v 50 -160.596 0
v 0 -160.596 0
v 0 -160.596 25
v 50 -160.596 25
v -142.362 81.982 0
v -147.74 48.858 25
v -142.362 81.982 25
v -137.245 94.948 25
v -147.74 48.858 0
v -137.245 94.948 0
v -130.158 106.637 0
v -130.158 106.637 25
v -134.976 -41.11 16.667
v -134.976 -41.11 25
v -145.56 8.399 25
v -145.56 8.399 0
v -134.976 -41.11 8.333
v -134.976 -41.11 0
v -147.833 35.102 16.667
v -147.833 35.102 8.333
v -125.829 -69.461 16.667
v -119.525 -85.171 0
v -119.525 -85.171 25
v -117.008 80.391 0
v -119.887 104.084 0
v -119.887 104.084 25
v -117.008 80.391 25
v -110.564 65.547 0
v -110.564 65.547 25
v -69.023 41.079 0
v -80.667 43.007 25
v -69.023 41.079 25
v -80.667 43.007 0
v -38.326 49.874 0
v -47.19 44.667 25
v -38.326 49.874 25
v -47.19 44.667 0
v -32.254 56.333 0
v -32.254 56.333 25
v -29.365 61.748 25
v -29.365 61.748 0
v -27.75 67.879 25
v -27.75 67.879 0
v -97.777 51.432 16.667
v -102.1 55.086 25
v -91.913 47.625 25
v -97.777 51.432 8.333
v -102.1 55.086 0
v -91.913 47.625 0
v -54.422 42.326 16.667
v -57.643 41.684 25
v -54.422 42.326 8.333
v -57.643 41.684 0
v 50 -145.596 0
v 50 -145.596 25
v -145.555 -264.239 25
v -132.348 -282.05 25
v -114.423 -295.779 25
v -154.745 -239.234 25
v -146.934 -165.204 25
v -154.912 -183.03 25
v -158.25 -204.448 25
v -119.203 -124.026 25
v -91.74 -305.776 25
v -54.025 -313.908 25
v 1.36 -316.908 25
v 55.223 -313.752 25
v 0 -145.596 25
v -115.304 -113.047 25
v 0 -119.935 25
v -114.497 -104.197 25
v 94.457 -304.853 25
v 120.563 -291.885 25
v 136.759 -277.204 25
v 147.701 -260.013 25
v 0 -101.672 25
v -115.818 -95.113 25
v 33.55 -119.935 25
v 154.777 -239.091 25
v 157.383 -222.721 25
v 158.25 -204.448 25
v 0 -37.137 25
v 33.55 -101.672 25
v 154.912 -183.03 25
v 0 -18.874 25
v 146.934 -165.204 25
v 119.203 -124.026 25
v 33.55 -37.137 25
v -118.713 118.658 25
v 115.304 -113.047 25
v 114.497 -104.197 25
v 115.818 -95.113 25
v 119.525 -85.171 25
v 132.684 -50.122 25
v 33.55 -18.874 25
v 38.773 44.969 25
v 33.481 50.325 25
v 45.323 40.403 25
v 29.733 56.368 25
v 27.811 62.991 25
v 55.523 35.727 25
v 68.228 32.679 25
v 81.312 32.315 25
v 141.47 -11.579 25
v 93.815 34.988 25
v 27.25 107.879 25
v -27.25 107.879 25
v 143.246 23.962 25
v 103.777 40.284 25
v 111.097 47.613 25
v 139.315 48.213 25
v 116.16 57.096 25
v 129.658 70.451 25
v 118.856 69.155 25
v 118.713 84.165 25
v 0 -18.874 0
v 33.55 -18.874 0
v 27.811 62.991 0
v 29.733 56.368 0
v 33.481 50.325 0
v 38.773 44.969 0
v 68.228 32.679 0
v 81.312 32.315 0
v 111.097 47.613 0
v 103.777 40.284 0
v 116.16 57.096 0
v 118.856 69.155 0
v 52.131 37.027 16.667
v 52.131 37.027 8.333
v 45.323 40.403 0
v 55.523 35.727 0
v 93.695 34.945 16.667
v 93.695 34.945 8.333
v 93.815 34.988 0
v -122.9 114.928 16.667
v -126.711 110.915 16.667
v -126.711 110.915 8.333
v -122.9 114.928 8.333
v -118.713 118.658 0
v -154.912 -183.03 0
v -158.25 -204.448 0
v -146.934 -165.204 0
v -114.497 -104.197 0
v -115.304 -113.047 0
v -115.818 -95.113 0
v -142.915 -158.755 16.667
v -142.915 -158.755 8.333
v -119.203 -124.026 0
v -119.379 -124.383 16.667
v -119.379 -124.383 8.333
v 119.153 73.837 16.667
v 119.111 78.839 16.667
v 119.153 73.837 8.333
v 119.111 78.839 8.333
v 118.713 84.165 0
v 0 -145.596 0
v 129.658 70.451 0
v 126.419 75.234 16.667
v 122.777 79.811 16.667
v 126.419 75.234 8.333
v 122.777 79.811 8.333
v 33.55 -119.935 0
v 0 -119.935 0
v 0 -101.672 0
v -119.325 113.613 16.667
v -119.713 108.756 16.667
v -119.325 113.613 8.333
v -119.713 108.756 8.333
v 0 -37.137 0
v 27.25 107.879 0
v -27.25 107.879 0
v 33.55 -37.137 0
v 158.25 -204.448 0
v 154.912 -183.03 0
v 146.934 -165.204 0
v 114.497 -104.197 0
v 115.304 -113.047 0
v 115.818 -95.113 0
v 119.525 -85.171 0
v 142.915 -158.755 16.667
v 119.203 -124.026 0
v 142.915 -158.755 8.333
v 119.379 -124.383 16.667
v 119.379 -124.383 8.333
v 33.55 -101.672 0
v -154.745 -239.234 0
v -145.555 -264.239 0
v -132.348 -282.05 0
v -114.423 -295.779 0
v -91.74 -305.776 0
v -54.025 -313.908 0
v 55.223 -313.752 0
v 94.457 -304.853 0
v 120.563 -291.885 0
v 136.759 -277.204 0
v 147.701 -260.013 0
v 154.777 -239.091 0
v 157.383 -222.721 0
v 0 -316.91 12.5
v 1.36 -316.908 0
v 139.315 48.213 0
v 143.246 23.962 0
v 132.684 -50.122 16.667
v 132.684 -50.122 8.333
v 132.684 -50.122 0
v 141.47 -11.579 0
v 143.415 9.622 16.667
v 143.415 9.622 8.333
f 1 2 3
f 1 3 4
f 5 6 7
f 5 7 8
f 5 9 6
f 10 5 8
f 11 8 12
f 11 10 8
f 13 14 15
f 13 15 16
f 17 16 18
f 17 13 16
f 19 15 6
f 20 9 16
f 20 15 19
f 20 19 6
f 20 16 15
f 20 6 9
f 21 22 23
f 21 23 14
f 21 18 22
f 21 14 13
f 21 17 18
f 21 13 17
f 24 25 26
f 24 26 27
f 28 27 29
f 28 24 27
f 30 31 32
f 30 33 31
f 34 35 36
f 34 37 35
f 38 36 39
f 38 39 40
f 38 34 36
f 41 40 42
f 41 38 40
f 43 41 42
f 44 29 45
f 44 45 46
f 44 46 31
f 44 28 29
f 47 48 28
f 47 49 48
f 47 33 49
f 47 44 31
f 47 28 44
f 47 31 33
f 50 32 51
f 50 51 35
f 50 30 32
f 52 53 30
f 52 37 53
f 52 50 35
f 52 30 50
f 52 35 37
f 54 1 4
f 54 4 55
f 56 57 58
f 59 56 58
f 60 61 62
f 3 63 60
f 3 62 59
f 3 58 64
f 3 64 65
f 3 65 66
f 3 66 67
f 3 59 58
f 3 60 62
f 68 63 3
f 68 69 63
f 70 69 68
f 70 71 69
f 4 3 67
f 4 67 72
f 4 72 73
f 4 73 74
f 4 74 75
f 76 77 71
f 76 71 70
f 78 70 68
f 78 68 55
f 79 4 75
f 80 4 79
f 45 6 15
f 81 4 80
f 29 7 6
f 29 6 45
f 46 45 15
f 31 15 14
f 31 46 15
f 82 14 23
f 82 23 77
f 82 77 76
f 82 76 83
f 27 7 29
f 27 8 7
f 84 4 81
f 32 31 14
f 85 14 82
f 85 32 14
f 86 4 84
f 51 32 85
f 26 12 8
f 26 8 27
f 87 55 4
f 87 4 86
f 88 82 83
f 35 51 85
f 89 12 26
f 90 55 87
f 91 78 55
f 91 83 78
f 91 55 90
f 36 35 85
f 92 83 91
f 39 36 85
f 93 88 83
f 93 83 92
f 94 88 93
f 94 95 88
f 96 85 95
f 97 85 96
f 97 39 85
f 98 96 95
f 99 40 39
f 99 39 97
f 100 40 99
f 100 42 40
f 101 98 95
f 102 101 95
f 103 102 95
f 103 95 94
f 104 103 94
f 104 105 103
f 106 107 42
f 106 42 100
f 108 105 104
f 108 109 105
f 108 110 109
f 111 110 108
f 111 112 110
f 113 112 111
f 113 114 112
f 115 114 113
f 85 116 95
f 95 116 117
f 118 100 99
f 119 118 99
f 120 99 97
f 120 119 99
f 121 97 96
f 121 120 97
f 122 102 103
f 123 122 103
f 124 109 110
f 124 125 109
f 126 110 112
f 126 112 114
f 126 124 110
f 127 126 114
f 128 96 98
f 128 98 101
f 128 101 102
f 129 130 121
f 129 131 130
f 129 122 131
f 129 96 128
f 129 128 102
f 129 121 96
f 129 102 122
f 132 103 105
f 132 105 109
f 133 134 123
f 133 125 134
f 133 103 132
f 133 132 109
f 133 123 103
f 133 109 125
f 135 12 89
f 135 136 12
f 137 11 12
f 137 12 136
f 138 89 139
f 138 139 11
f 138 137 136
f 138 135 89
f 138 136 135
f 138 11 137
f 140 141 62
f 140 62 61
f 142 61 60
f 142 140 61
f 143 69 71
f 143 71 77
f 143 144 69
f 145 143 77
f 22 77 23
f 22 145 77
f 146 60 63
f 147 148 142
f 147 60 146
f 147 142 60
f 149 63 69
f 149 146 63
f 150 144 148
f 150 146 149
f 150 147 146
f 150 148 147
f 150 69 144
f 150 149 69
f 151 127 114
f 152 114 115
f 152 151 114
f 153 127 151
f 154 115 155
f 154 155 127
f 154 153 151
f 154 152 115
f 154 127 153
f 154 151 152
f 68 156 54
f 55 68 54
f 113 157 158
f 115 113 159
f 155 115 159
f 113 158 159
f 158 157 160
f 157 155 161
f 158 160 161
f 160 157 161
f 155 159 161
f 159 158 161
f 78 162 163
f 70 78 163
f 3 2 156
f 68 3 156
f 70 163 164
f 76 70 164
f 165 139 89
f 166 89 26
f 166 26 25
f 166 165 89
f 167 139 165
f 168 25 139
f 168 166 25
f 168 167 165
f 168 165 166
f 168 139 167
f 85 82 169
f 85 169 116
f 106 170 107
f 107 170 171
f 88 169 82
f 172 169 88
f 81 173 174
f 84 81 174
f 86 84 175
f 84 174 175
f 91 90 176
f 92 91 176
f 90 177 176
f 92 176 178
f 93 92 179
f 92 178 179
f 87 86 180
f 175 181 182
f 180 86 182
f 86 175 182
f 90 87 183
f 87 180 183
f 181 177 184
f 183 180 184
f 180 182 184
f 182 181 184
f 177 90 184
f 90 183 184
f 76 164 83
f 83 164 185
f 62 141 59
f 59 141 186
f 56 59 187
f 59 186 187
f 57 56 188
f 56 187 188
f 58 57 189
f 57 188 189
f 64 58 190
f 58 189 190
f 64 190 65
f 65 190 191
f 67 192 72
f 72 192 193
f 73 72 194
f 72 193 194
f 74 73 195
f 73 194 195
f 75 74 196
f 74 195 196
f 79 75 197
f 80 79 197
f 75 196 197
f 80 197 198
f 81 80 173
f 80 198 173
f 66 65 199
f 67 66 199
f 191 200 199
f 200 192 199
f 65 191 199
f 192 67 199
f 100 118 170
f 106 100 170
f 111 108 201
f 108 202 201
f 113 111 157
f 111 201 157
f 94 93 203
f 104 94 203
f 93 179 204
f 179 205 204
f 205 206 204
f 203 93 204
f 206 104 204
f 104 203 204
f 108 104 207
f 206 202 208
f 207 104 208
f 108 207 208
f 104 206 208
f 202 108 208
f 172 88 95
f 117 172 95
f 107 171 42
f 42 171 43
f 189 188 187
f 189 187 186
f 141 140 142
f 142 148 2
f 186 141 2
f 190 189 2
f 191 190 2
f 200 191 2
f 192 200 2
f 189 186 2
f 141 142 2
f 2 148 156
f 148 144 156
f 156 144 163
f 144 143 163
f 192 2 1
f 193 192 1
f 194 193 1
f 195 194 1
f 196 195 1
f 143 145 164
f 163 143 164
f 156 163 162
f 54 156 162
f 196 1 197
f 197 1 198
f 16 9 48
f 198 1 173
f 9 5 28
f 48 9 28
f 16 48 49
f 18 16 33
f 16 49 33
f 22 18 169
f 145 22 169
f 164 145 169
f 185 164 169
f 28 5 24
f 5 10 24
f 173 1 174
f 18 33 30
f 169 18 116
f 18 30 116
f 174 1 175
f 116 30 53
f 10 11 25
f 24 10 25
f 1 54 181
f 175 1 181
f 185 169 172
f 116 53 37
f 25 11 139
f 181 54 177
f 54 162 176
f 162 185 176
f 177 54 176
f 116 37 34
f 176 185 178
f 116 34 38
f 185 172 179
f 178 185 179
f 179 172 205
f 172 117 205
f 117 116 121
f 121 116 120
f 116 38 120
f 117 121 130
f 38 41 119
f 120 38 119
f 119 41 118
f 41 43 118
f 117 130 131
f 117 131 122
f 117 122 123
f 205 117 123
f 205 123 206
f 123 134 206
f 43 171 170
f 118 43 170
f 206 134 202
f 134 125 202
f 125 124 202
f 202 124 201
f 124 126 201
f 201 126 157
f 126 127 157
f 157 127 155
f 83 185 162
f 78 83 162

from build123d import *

# Parameters (mm, degrees)
F0_W     = 50
F0_H     = 15
F0_W_2   = 33.55
F0_H_2   = 18.263
F1_DEPTH = 25


# Not quite as in the source:
# - a feature names something its author has since deleted; it is built from what else it names


with BuildPart() as f1:
    # F0 (on Top) → F1 (new body)
    with BuildSketch(Plane.XY):
        Polygon((27.25, 107.8786835152), (-27.25, 107.8786835152), (-27.75, 67.8786835152), (-28.0282922993, 45.6152995713), (-28.25, 27.8786835152), (28.25, 27.8786835152), (28.0907844192, 40.6159299829), (27.8110993763, 62.99073341), align=None)
        with BuildLine():
            Line((-28.0282922993, 45.6152995713), (-27.75, 67.8786835152))
            add(Edge.make_bspline(
                [(-119.8866222784, 104.0838235955), (-121.0423578492, 26.6975843315), (-33.4381163475, 27.9588649836), (-27.75, 67.8786835152)],
                knots=[5.8207414298, 5.8207414298, 5.8207414298, 5.8207414298, 104.177036671, 104.177036671, 104.177036671, 104.177036671], degree=3))
            add(Edge.make_bspline(
                [(-129.4312865498, 88.9177944447), (-128.9681788838, 89.9439533029), (-126.7042715733, 94.6909513961), (-123.5656981618, 99.854792643), (-120.3833088728, 103.5358856243), (-119.8866222778, 104.0838235953)],
                knots=[174.7937382561, 174.7937382561, 174.7937382561, 174.7937382561, 178.1663413599, 190.5368056939, 192.7537167942, 192.7537167942, 192.7537167942, 192.7537167942], degree=3))
            add(Edge.make_bspline(
                [(-129.4312865498, 88.9177944447), (-129.3109849454, 88.0758069), (-128.4336564101, 82.4912333506), (-125.9636072037, 72.6752311218), (-120.2024501307, 60.4880102216), (-112.6215186167, 50.3680139367), (-103.6339611104, 42.3905323107), (-93.696674412, 36.532063254), (-83.2179047221, 32.6896328601), (-72.5392583415, 30.7367375732), (-61.9410573447, 30.5552142432), (-51.6845955009, 32.0994665415), (-42.5038344938, 35.1003258688), (-35.1676094551, 39.272763754), (-30.7048923289, 42.9689824885), (-28.563789449, 45.0637979027), (-28.0282922993, 45.6152995713)],
                knots=[31.2550682463, 31.2550682463, 31.2550682463, 31.2550682463, 33.8015913522, 48.177750167, 61.4744919422, 73.96612477, 85.8554939797, 97.2898755487, 108.3722273852, 119.1669646926, 129.7095146782, 140.0247340346, 150.1520713556, 158.5067230901, 165.1780752822, 167.4830132535, 167.4830132535, 167.4830132535, 167.4830132535], degree=3))
        make_face()
        with BuildLine():
            add(Edge.make_bspline(
                [(27.8110993763, 62.99073341), (32.2933669496, 29.2229355953), (113.1124852102, 12.6623549852), (118.8562015646, 69.1546411271)],
                knots=[0, 0, 0, 0, 86.4138969398, 86.4138969398, 86.4138969398, 86.4138969398], degree=3))
            Line((27.8110993763, 62.99073341), (28.0907844192, 40.6159299829))
            add(Edge.make_bspline(
                [(28.0907844192, 40.6159299829), (29.287798378, 39.3429032121), (32.9148444473, 35.925399713), (39.7570190189, 31.2557479048), (48.6151552623, 26.9252261046), (58.1307163688, 23.8031969869), (68.0898843108, 21.9265931964), (78.3013198669, 21.4068174609), (88.5616997912, 22.40383688), (98.6335430856, 25.1427600429), (108.1809690997, 29.9014168198), (116.6857490885, 36.9285745162), (122.9775786719, 45.5470774874), (125.7269242874, 51.946079615), (126.7237292348, 54.9306006364)],
                knots=[23.8574779363, 23.8574779363, 23.8574779363, 23.8574779363, 29.0928113686, 38.7540016942, 48.5866257781, 58.5851158791, 68.7062096676, 78.9034224293, 89.1584624493, 99.5062924883, 110.045747029, 120.9208868969, 132.2887869108, 141.7007014746, 141.7007014746, 141.7007014746, 141.7007014746], degree=3))
            add(Edge.make_bspline(
                [(126.7237292348, 54.9306006364), (126.1874967207, 56.2317474218), (124.1003720443, 60.9435117835), (121.4166682373, 65.6994419315), (119.0247712369, 68.9308388277), (118.8562015646, 69.1546411271)],
                knots=[140.16898266, 140.16898266, 140.16898266, 140.16898266, 144.3874002602, 155.6048910041, 156.4452003175, 156.4452003175, 156.4452003175, 156.4452003175], degree=3))
        make_face()
        with BuildLine():
            Line((-28.25, 27.8786835152), (-28.0282922993, 45.6152995713))
            add(Edge.make_bspline(
                [(-129.4312865498, 88.9177944447), (-129.3109849454, 88.0758069), (-128.4336564101, 82.4912333506), (-125.9636072037, 72.6752311218), (-120.2024501307, 60.4880102216), (-112.6215186167, 50.3680139367), (-103.6339611104, 42.3905323107), (-93.696674412, 36.532063254), (-83.2179047221, 32.6896328601), (-72.5392583415, 30.7367375732), (-61.9410573447, 30.5552142432), (-51.6845955009, 32.0994665415), (-42.5038344938, 35.1003258688), (-35.1676094551, 39.272763754), (-30.7048923289, 42.9689824885), (-28.563789449, 45.0637979027), (-28.0282922993, 45.6152995713)],
                knots=[31.2550682463, 31.2550682463, 31.2550682463, 31.2550682463, 33.8015913522, 48.177750167, 61.4744919422, 73.96612477, 85.8554939797, 97.2898755487, 108.3722273852, 119.1669646926, 129.7095146782, 140.0247340346, 150.1520713556, 158.5067230901, 165.1780752822, 167.4830132535, 167.4830132535, 167.4830132535, 167.4830132535], degree=3))
            add(Edge.make_bspline(
                [(-130.1583163956, 106.6368603294), (-130.2482463228, 105.1422313843), (-130.4708327377, 99.2283714352), (-130.0575927336, 93.3012938045), (-129.4312865498, 88.9177944447)],
                knots=[13.5070543021, 13.5070543021, 13.5070543021, 13.5070543021, 17.9975296122, 31.2550682463, 31.2550682463, 31.2550682463, 31.2550682463], degree=3))
            add(Edge.make_bspline(
                [(-119.5249942189, -85.1707845054), (-126.9605969931, -69.461302998), (-172.4103162726, 49.7161929114), (-130.1583163912, 106.6368603279)],
                knots=[0, 0, 0, 0, 189.1875471614, 189.1875471614, 189.1875471614, 189.1875471614], degree=3))
            add(Edge.make_bspline(
                [(-158.25, -204.448345688), (-157.6418556412, -147.7076234473), (-96.9115691033, -132.1890450103), (-119.5249942189, -85.1707845054)],
                knots=[0, 0, 0, 0, 125.406390086, 125.406390086, 125.406390086, 125.406390086], degree=3))
            add(Edge.make_bspline(
                [(-158.25, -204.448345688), (-158.25, -290.2131974697), (-106.7391799071, -316.9097596875), (0, -316.9097596875)],
                knots=[0, 0, 0, 0, 194.1407534207, 194.1407534207, 194.1407534207, 194.1407534207], degree=3))
            add(Edge.make_bspline(
                [(158.25, -204.448345688), (158.25, -290.2131974697), (106.7391799071, -316.9097596875), (0, -316.9097596875)],
                knots=[0, 0, 0, 0, 194.1407534207, 194.1407534207, 194.1407534207, 194.1407534207], degree=3))
            add(Edge.make_bspline(
                [(158.25, -204.448345688), (157.6418556412, -147.7076234473), (96.9115691033, -132.1890450103), (119.5249942189, -85.1707845054)],
                knots=[0, 0, 0, 0, 125.406390086, 125.406390086, 125.406390086, 125.406390086], degree=3))
            add(Edge.make_bspline(
                [(119.5249942189, -85.1707845054), (126.5438310067, -70.3415708106), (163.0129687478, 16.9513401574), (129.6580469223, 70.4506637657)],
                knots=[0, 0, 0, 0, 155.1840675903, 155.1840675903, 155.1840675903, 155.1840675903], degree=3))
            add(Edge.make_bspline(
                [(126.7237292348, 54.9306006364), (127.0043283083, 55.7707387556), (128.5538224017, 60.8007183147), (129.4403792123, 66.0439240135), (129.6568620638, 70.4263535727), (129.6580469223, 70.4506637657)],
                knots=[141.7007014746, 141.7007014746, 141.7007014746, 141.7007014746, 144.3501410806, 157.4352190661, 157.5082077989, 157.5082077989, 157.5082077989, 157.5082077989], degree=3))
            add(Edge.make_bspline(
                [(28.0907844192, 40.6159299829), (29.287798378, 39.3429032121), (32.9148444473, 35.925399713), (39.7570190189, 31.2557479048), (48.6151552623, 26.9252261046), (58.1307163688, 23.8031969869), (68.0898843108, 21.9265931964), (78.3013198669, 21.4068174609), (88.5616997912, 22.40383688), (98.6335430856, 25.1427600429), (108.1809690997, 29.9014168198), (116.6857490885, 36.9285745162), (122.9775786719, 45.5470774874), (125.7269242874, 51.946079615), (126.7237292348, 54.9306006364)],
                knots=[23.8574779363, 23.8574779363, 23.8574779363, 23.8574779363, 29.0928113686, 38.7540016942, 48.5866257781, 58.5851158791, 68.7062096676, 78.9034224293, 89.1584624493, 99.5062924883, 110.045747029, 120.9208868969, 132.2887869108, 141.7007014746, 141.7007014746, 141.7007014746, 141.7007014746], degree=3))
            Line((28.0907844192, 40.6159299829), (28.25, 27.8786835152))
            Line((28.25, 27.8786835152), (-28.25, 27.8786835152))
        make_face()
        with Locations((25, -153.0963164848)):
            Rectangle(F0_W, F0_H, mode=Mode.SUBTRACT)
        Polygon((0, -119.9348074679), (0, -101.6718074679), (27.3104757071, -101.6718074679), (33.55, -101.6718074679), (33.55, -119.9348074679), align=None, mode=Mode.SUBTRACT)
        with Locations((16.775, -28.0059413371)):
            Rectangle(F0_W_2, F0_H_2, mode=Mode.SUBTRACT)
        with BuildLine():
            add(Edge.make_bspline(
                [(-129.4312865498, 88.9177944447), (-128.9681788838, 89.9439533029), (-126.7042715733, 94.6909513961), (-123.5656981618, 99.854792643), (-120.3833088728, 103.5358856243), (-119.8866222778, 104.0838235953)],
                knots=[174.7937382561, 174.7937382561, 174.7937382561, 174.7937382561, 178.1663413599, 190.5368056939, 192.7537167942, 192.7537167942, 192.7537167942, 192.7537167942], degree=3))
            add(Edge.make_bspline(
                [(-118.7134671008, 118.6576419779), (-119.4389657293, 113.5187304004), (-119.8182256607, 108.6635537275), (-119.8866222784, 104.0838235955)],
                knots=[0, 0, 0, 0, 5.8207414298, 5.8207414298, 5.8207414298, 5.8207414298], degree=3))
            add(Edge.make_bspline(
                [(-130.1583163912, 106.6368603279), (-126.888150362, 111.0423330505), (-123.0926289669, 115.0748717049), (-118.7134671008, 118.6576419779)],
                knots=[189.1875471614, 189.1875471614, 189.1875471614, 189.1875471614, 203.8300419931, 203.8300419931, 203.8300419931, 203.8300419931], degree=3))
            add(Edge.make_bspline(
                [(-130.1583163956, 106.6368603294), (-130.2482463228, 105.1422313843), (-130.4708327377, 99.2283714352), (-130.0575927336, 93.3012938045), (-129.4312865498, 88.9177944447)],
                knots=[13.5070543021, 13.5070543021, 13.5070543021, 13.5070543021, 17.9975296122, 31.2550682463, 31.2550682463, 31.2550682463, 31.2550682463], degree=3))
        make_face()
        with BuildLine():
            add(Edge.make_bspline(
                [(118.8562015646, 69.1546411271), (119.3162948222, 73.679885474), (119.2946583668, 78.6738817109), (118.7134671008, 84.1653342065)],
                knots=[86.4138969398, 86.4138969398, 86.4138969398, 86.4138969398, 93.3359747193, 93.3359747193, 93.3359747193, 93.3359747193], degree=3))
            add(Edge.make_bspline(
                [(126.7237292348, 54.9306006364), (126.1874967207, 56.2317474218), (124.1003720443, 60.9435117835), (121.4166682373, 65.6994419315), (119.0247712369, 68.9308388277), (118.8562015646, 69.1546411271)],
                knots=[140.16898266, 140.16898266, 140.16898266, 140.16898266, 144.3874002602, 155.6048910041, 156.4452003175, 156.4452003175, 156.4452003175, 156.4452003175], degree=3))
            add(Edge.make_bspline(
                [(126.7237292348, 54.9306006364), (127.0043283083, 55.7707387556), (128.5538224017, 60.8007183147), (129.4403792123, 66.0439240135), (129.6568620638, 70.4263535727), (129.6580469223, 70.4506637657)],
                knots=[141.7007014746, 141.7007014746, 141.7007014746, 141.7007014746, 144.3501410806, 157.4352190661, 157.5082077989, 157.5082077989, 157.5082077989, 157.5082077989], degree=3))
            add(Edge.make_bspline(
                [(129.6580469223, 70.4506637657), (126.6158182503, 75.3302187852), (122.992732948, 79.9286496563), (118.7134671008, 84.1653342065)],
                knots=[155.1840675903, 155.1840675903, 155.1840675903, 155.1840675903, 169.3380632837, 169.3380632837, 169.3380632837, 169.3380632837], degree=3))
        make_face()
    extrude(amount=F1_DEPTH)


solid = f1.part
